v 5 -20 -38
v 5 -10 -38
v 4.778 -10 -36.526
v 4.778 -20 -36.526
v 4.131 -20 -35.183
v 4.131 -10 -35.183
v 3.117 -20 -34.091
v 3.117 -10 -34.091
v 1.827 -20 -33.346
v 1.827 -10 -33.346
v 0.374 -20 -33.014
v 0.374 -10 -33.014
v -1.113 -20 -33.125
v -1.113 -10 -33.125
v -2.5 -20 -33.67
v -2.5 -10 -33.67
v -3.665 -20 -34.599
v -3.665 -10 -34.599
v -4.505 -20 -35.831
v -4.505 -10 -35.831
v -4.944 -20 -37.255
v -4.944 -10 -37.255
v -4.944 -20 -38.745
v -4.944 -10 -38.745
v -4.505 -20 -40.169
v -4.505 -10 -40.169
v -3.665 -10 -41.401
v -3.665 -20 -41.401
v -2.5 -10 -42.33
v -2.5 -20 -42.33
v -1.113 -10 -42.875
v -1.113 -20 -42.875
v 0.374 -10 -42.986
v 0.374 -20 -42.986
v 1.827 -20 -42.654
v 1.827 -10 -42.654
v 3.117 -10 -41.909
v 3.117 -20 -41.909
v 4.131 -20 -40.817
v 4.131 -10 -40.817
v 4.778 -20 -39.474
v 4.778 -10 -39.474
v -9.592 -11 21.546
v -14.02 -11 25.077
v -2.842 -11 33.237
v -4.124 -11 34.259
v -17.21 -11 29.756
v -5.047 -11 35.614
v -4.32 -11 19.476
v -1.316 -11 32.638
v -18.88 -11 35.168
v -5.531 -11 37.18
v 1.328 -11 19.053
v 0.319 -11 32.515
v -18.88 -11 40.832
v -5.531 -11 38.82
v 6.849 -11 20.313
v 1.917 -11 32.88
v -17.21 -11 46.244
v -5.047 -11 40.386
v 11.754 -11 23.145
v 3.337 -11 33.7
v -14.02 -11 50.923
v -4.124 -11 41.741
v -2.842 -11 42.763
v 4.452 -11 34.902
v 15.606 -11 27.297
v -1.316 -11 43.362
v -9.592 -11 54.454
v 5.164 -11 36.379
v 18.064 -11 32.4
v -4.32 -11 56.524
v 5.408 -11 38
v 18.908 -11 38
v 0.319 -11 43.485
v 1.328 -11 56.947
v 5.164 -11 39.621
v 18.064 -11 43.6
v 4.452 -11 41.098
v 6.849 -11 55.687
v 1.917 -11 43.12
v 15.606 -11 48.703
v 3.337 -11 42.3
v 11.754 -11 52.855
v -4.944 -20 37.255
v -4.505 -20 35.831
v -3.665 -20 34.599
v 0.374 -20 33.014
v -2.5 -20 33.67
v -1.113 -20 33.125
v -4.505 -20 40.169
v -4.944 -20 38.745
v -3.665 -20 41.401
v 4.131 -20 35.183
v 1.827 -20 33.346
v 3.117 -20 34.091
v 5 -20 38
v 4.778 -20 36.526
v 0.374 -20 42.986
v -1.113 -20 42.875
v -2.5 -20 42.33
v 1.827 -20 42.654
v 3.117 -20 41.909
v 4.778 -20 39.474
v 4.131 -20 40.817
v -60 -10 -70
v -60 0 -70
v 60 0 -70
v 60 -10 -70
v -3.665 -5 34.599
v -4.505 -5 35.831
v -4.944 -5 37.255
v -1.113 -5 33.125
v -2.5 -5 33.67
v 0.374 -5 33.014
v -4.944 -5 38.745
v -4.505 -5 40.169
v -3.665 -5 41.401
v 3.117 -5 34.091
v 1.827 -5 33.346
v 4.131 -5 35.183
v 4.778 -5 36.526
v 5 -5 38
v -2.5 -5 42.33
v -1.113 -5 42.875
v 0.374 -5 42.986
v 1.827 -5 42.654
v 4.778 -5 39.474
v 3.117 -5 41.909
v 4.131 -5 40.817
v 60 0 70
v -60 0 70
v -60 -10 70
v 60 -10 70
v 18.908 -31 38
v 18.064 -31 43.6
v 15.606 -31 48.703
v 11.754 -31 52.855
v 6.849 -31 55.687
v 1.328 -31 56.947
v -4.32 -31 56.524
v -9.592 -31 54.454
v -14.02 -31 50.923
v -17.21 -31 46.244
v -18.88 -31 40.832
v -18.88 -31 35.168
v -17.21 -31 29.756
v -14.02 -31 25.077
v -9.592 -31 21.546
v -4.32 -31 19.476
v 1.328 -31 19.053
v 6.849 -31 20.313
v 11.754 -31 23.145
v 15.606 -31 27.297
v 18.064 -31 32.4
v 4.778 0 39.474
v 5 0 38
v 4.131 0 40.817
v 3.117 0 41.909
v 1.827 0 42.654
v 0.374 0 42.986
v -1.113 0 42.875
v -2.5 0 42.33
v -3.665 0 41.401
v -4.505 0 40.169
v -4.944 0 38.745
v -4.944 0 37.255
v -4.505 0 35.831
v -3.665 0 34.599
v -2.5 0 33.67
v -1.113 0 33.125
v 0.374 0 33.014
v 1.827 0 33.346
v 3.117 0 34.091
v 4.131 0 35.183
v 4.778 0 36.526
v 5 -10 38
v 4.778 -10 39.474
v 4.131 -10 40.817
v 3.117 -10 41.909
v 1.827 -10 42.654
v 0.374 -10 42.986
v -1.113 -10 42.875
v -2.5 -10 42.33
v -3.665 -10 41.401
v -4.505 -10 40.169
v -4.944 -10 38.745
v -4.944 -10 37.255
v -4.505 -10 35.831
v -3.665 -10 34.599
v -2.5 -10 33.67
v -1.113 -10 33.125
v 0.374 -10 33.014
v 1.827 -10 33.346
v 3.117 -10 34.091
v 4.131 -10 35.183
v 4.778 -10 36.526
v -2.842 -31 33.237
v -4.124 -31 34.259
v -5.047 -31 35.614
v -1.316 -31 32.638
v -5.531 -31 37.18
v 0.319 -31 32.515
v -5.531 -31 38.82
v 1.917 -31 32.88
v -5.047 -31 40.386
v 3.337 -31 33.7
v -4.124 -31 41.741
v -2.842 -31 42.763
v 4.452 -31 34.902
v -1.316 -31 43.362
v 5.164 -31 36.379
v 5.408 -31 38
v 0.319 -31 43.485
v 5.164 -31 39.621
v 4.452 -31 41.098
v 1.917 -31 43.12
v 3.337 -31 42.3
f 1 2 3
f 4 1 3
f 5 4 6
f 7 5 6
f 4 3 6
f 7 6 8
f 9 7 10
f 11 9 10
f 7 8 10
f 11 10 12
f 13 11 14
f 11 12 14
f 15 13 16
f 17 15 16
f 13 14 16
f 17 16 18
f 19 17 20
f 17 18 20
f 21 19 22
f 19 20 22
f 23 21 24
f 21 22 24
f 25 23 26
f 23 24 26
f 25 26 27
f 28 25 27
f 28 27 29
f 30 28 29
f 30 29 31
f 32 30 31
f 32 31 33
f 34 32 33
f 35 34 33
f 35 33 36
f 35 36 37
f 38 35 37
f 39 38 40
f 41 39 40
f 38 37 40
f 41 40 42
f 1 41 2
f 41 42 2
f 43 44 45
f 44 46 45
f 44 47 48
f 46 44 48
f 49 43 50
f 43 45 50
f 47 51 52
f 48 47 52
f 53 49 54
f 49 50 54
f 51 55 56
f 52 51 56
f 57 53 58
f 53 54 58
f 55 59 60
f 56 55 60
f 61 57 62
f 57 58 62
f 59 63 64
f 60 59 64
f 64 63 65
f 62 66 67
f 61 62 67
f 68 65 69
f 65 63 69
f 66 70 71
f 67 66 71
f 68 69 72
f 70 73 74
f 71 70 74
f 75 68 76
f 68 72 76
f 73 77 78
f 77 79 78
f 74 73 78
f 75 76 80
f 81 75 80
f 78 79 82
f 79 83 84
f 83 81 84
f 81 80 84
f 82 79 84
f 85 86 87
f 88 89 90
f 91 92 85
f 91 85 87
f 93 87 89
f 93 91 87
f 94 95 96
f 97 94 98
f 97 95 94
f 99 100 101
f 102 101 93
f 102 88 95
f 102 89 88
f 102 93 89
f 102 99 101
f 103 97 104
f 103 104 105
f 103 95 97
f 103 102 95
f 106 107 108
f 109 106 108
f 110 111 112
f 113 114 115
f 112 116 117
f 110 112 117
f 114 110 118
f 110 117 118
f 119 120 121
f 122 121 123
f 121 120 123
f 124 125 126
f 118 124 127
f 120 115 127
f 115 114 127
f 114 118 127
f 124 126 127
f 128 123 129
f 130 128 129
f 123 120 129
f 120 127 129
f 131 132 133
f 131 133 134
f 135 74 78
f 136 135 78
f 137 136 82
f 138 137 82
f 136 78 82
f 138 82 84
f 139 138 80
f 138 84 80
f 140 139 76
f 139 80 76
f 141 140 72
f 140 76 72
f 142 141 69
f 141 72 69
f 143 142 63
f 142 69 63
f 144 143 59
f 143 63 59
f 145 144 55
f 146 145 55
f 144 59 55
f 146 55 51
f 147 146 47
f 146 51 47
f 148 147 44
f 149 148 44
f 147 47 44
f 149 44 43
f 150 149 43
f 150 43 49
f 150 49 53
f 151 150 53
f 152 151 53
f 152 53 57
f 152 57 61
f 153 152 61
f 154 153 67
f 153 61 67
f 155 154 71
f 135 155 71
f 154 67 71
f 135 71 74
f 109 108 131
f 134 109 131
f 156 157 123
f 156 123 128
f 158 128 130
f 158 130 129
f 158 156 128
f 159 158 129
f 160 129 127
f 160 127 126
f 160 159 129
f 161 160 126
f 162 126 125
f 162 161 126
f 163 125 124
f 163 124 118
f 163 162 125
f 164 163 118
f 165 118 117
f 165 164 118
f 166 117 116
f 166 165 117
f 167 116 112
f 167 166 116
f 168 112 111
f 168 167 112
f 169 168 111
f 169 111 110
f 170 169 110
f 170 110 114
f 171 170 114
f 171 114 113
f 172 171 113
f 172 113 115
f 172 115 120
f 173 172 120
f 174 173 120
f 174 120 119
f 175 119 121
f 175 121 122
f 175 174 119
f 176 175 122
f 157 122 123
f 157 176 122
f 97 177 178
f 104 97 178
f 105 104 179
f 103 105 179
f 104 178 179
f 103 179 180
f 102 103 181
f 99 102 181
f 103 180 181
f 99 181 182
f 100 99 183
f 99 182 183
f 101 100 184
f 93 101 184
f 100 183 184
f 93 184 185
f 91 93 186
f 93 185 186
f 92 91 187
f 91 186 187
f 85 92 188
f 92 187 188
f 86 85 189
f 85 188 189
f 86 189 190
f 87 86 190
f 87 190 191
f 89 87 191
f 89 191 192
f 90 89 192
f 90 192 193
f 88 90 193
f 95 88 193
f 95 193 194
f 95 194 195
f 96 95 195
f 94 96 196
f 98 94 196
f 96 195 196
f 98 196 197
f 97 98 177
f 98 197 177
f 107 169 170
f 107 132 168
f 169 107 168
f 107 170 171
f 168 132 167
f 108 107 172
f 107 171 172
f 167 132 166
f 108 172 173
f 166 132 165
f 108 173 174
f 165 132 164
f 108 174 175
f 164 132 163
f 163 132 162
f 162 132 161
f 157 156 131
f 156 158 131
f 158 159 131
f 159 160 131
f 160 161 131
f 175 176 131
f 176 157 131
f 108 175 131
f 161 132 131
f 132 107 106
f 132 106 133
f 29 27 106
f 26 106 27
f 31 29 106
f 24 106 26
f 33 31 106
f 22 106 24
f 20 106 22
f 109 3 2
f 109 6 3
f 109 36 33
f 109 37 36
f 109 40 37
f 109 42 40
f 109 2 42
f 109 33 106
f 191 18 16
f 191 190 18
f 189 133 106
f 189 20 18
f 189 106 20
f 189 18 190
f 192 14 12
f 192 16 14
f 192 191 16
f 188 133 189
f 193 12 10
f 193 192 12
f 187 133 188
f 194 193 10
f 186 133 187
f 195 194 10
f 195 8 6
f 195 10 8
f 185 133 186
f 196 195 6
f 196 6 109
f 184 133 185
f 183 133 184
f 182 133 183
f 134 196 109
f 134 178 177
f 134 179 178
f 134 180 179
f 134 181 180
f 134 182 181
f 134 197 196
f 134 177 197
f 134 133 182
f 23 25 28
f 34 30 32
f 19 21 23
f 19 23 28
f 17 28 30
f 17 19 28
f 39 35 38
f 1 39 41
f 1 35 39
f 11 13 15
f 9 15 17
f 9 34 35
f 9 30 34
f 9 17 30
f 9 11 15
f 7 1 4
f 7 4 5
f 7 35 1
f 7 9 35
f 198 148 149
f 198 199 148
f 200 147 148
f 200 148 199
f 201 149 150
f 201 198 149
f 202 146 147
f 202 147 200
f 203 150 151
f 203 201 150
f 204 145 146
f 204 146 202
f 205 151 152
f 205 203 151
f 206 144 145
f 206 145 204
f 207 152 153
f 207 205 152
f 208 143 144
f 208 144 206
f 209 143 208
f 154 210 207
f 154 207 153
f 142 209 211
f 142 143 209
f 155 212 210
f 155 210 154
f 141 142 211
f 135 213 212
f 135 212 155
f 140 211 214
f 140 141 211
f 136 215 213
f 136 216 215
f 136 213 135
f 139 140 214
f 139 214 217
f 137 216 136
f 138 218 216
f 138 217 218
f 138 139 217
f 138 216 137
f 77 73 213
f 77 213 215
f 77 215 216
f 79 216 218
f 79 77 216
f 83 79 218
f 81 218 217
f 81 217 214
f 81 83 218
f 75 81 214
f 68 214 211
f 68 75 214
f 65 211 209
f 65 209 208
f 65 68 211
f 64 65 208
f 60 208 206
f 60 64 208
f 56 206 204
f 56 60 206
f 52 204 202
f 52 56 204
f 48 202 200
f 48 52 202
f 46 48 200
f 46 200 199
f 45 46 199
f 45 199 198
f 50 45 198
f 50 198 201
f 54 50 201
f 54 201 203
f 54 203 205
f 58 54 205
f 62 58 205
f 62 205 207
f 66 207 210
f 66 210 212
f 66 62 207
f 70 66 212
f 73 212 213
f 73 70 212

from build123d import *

# Parameters (mm, degrees)
F0_W     = 120
F0_H     = 140
F0_R     = 5
F1_DEPTH = 10
F2_DEPTH = 5
F3_R     = 5
F4_DEPTH = 10
F6_R     = 19
F6_R_2   = 5.5
F7_DEPTH = 20


with BuildPart() as f1:
    # F0 (on Front) → F1 (new body)
    with BuildSketch(Plane.XZ):
        Rectangle(F0_W, F0_H)
        with Locations((0, 38)):
            Circle(F0_R, mode=Mode.SUBTRACT)
        with Locations((0, 38)):
            Circle(F0_R)
    extrude(amount=F1_DEPTH)

    # F0 (on Front) → F2 (cut)
    with BuildSketch(Plane.XZ):
        with Locations((0, 38)):
            Circle(F0_R)
    extrude(amount=F2_DEPTH, mode=Mode.SUBTRACT)

    # F3 (on face) → F4 (join)
    with BuildSketch(Plane.XZ.offset(10)):
        with Locations((0, 38)):
            Circle(F3_R)
        with Locations((0, -38)):
            Circle(F3_R)
    extrude(amount=F4_DEPTH)


with BuildPart() as f7:
    # F6 (on offset) → F7 (new body)
    with BuildSketch(Plane.XZ.offset(11)):
        with Locations((-0.092058, 38)):
            Circle(F6_R)
        with Locations((-0.092058, 38)):
            Circle(F6_R_2, mode=Mode.SUBTRACT)
    extrude(amount=F7_DEPTH)


solid = Compound([f1.part, f7.part])
